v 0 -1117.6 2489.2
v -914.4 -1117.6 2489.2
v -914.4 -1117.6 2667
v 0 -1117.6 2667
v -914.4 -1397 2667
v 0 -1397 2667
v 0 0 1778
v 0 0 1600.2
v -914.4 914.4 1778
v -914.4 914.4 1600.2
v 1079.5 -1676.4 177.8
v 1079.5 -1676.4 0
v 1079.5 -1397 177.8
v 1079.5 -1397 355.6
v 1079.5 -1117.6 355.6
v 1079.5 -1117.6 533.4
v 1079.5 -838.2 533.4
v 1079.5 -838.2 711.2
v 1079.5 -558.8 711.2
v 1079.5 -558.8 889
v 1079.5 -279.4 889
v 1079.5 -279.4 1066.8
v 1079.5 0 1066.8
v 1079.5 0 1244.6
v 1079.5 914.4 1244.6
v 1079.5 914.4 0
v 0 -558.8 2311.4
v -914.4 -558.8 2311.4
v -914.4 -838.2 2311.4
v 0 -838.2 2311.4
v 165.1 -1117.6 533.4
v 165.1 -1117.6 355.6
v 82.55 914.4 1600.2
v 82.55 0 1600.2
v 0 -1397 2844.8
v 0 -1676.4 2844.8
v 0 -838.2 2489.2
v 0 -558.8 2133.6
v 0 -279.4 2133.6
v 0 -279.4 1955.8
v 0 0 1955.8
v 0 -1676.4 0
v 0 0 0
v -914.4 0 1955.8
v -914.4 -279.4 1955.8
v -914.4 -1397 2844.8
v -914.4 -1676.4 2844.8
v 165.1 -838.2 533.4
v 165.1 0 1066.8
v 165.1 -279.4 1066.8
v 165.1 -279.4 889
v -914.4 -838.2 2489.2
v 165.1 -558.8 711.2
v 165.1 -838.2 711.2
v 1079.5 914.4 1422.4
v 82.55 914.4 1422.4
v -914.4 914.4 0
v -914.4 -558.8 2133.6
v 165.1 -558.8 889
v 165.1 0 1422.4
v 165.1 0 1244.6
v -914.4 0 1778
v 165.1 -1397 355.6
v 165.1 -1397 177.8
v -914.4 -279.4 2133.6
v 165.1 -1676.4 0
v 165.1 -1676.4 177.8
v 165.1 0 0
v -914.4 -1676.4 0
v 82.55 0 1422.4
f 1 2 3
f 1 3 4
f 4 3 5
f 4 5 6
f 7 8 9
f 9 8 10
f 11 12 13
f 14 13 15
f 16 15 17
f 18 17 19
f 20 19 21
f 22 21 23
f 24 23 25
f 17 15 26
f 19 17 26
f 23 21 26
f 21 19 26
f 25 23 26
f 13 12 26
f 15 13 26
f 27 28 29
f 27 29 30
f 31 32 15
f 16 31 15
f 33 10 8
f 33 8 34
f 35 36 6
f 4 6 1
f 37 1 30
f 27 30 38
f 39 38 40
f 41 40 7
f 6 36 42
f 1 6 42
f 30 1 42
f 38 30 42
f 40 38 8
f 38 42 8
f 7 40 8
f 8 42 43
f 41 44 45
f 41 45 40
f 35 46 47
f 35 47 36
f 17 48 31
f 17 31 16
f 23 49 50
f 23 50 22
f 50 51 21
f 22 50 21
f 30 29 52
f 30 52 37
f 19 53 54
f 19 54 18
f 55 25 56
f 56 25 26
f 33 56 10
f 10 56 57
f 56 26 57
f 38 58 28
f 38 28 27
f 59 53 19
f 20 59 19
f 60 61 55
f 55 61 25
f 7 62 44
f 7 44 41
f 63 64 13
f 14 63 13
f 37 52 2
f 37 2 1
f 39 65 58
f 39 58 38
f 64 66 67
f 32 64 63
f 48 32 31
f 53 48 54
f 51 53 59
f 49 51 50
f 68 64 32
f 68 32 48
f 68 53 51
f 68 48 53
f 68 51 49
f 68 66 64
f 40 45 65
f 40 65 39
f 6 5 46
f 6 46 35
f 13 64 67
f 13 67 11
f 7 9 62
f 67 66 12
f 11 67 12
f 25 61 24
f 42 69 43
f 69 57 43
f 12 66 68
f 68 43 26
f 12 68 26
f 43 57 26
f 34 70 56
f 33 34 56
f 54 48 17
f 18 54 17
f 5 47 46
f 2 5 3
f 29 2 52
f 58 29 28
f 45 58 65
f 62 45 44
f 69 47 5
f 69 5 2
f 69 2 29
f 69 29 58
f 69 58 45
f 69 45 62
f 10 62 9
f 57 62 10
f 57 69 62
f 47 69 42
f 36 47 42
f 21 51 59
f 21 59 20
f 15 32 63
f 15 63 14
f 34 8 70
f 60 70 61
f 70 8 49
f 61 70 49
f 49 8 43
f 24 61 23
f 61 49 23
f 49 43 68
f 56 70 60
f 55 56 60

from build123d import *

# Parameters (mm, degrees)
F0_W      = 914.4
F0_H      = 279.4
F1_DEPTH  = 177.8
F2_DEPTH  = 355.6
F3_DEPTH  = 533.4
F4_DEPTH  = 711.2
F5_DEPTH  = 889
F6_DEPTH  = 1066.8
F7_DEPTH  = 1244.6
F8_DEPTH  = 1422.4
F9_DEPTH  = 1600.2
F10_DEPTH = 1778
F11_DEPTH = 1955.8
F12_DEPTH = 2133.6
F13_DEPTH = 2311.4
F14_DEPTH = 2489.2
F15_DEPTH = 2667
F16_DEPTH = 2844.8


with BuildPart() as f1:
    # F0 (on Top) → F1 (new body)
    with BuildSketch(Plane.XY):
        with Locations((622.3, -1536.7)):
            Rectangle(F0_W, F0_H)
    extrude(amount=F1_DEPTH)

    # F0 (on Top) → F2 (join)
    with BuildSketch(Plane.XY):
        with Locations((622.3, -1257.3)):
            Rectangle(F0_W, F0_H)
    extrude(amount=F2_DEPTH)

    # F0 (on Top) → F3 (join)
    with BuildSketch(Plane.XY):
        with Locations((622.3, -977.9)):
            Rectangle(F0_W, F0_H)
    extrude(amount=F3_DEPTH)

    # F0 (on Top) → F4 (join)
    with BuildSketch(Plane.XY):
        with Locations((622.3, -698.5)):
            Rectangle(F0_W, F0_H)
    extrude(amount=F4_DEPTH)

    # F0 (on Top) → F5 (join)
    with BuildSketch(Plane.XY):
        with Locations((622.3, -419.1)):
            Rectangle(F0_W, F0_H)
    extrude(amount=F5_DEPTH)

    # F0 (on Top) → F6 (join)
    with BuildSketch(Plane.XY):
        with Locations((622.3, -139.7)):
            Rectangle(F0_W, F0_H)
    extrude(amount=F6_DEPTH)

    # F0 (on Top) → F7 (join)
    with BuildSketch(Plane.XY):
        Polygon((1079.5, 914.4), (165.1, 0), (1079.5, 0), align=None)
    extrude(amount=F7_DEPTH)

    # F0 (on Top) → F8 (join)
    with BuildSketch(Plane.XY):
        Polygon((82.55, 914.4), (82.55, 0), (165.1, 0), (1079.5, 914.4), align=None)
    extrude(amount=F8_DEPTH)

    # F0 (on Top) → F9 (join)
    with BuildSketch(Plane.XY):
        Polygon((-914.4, 914.4), (0, 0), (82.55, 0), (82.55, 914.4), align=None)
    extrude(amount=F9_DEPTH)

    # F0 (on Top) → F10 (join)
    with BuildSketch(Plane.XY):
        Polygon((-914.4, 0), (0, 0), (-914.4, 914.4), align=None)
    extrude(amount=F10_DEPTH)

    # F0 (on Top) → F11 (join)
    with BuildSketch(Plane.XY):
        with Locations((-457.2, -139.7)):
            Rectangle(F0_W, F0_H)
    extrude(amount=F11_DEPTH)

    # F0 (on Top) → F12 (join)
    with BuildSketch(Plane.XY):
        with Locations((-457.2, -419.1)):
            Rectangle(F0_W, F0_H)
    extrude(amount=F12_DEPTH)

    # F0 (on Top) → F13 (join)
    with BuildSketch(Plane.XY):
        with Locations((-457.2, -698.5)):
            Rectangle(F0_W, F0_H)
    extrude(amount=F13_DEPTH)

    # F0 (on Top) → F14 (join)
    with BuildSketch(Plane.XY):
        with Locations((-457.2, -977.9)):
            Rectangle(F0_W, F0_H)
    extrude(amount=F14_DEPTH)

    # F0 (on Top) → F15 (join)
    with BuildSketch(Plane.XY):
        with Locations((-457.2, -1257.3)):
            Rectangle(F0_W, F0_H)
    extrude(amount=F15_DEPTH)

    # F0 (on Top) → F16 (join)
    with BuildSketch(Plane.XY):
        with Locations((-457.2, -1536.7)):
            Rectangle(F0_W, F0_H)
    extrude(amount=F16_DEPTH)


solid = f1.part
